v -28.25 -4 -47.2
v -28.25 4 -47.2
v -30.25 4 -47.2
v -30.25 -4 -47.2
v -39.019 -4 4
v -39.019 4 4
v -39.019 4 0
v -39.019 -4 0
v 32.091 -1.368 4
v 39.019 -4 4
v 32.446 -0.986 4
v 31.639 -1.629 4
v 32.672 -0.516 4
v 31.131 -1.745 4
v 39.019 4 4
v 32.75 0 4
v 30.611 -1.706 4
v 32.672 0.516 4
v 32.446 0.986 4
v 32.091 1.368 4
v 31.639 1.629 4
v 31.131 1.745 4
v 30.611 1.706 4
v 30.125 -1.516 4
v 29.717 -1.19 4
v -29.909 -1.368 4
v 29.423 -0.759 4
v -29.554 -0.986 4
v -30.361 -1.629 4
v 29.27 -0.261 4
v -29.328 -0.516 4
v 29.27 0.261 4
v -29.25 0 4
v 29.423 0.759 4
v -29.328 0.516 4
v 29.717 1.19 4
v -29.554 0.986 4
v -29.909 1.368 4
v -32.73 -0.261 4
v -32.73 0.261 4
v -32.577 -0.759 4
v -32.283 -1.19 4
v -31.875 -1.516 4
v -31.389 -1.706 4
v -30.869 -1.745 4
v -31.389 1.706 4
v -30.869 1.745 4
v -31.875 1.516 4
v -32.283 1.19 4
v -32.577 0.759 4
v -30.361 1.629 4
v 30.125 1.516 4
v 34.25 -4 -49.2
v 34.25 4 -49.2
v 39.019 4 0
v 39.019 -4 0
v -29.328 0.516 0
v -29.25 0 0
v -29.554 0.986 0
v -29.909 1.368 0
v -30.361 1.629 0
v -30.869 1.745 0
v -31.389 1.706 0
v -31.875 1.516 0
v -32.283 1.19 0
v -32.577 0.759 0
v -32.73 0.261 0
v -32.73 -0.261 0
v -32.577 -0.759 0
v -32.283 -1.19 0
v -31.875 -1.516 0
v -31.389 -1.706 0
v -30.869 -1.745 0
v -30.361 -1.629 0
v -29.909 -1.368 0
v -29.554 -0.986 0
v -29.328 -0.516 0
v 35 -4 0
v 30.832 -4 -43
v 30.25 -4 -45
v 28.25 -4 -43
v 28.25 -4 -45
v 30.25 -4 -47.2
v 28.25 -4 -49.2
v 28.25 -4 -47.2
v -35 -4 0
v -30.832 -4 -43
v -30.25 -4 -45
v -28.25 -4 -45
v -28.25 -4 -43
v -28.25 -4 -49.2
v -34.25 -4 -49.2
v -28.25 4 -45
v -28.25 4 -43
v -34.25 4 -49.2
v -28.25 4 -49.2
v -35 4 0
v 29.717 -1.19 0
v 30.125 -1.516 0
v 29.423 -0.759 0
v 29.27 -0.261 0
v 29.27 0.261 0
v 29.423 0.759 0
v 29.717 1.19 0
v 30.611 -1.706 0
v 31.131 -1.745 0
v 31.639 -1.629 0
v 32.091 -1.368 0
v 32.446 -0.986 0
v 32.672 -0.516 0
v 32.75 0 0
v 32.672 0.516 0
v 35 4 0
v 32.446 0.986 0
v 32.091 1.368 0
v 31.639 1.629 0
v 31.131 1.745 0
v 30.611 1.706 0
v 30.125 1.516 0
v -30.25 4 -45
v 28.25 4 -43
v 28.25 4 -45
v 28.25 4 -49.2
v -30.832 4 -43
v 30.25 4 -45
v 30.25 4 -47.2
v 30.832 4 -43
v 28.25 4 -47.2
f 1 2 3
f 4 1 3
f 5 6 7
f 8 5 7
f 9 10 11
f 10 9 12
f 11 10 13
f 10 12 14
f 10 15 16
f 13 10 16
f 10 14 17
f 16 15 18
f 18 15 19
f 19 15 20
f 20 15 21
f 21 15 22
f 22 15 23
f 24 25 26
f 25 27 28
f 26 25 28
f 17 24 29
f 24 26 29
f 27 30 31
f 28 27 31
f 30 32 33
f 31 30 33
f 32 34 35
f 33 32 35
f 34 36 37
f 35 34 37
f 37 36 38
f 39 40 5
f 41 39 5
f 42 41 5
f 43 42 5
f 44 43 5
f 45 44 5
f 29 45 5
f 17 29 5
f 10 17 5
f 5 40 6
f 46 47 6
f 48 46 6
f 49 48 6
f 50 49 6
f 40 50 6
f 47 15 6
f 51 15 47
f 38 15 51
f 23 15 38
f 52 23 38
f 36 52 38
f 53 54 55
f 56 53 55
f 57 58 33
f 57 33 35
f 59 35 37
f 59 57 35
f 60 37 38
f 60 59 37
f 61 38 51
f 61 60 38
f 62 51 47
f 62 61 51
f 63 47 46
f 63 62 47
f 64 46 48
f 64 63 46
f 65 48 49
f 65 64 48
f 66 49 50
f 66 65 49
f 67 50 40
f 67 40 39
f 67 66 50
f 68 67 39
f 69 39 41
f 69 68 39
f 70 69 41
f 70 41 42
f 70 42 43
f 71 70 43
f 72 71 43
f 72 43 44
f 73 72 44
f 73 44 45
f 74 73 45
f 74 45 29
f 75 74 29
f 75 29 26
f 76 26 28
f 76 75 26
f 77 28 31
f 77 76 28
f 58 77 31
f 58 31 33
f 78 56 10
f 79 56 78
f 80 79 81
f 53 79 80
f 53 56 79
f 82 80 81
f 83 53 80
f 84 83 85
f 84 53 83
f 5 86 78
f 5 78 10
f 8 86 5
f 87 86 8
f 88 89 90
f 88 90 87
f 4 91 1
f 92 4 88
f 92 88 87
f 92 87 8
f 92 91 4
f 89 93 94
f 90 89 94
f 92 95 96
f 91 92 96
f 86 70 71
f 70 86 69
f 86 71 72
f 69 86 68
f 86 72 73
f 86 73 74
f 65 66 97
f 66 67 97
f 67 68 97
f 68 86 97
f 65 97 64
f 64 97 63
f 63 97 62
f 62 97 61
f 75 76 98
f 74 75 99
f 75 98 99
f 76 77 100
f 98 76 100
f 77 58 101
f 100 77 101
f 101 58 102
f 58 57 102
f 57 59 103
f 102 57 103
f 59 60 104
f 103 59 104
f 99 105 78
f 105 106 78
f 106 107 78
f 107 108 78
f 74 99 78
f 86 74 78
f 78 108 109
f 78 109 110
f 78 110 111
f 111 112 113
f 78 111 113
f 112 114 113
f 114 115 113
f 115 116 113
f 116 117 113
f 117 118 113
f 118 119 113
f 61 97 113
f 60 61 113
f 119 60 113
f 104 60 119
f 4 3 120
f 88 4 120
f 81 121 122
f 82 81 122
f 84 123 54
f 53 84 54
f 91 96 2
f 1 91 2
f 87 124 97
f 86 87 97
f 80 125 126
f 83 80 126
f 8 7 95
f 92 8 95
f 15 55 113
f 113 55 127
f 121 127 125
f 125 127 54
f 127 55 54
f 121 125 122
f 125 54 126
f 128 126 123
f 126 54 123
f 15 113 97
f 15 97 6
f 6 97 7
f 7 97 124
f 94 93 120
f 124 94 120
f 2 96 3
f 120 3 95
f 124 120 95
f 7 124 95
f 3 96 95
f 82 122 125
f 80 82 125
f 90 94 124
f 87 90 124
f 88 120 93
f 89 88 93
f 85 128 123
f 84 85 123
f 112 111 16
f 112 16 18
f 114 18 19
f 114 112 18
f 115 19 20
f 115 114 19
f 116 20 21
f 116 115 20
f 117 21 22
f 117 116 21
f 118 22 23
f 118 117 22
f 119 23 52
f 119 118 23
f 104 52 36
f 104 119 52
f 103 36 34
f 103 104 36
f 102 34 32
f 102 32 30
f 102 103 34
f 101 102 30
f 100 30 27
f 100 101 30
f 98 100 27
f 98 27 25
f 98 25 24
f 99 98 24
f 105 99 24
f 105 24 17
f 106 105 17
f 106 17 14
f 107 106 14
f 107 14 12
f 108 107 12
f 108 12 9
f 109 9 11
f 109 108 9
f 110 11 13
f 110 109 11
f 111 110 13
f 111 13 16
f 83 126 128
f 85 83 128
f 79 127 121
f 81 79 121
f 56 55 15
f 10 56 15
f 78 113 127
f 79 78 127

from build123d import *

# Parameters (mm, degrees)
ESBO_O1_W                = 70
ESBO_O1_H                = 8
ESBO_O1_R                = 1.75
RESSALTO_EXTRUS_O1_DEPTH = 4
RESSALTO_EXTRUS_O2_DEPTH = 8


with BuildPart() as part:
    # Esboço1 → Ressalto-extrusão1 (new body)
    with BuildSketch(Plane.XY):
        Rectangle(ESBO_O1_W, ESBO_O1_H)
        with Locations((-31, 0)):
            Circle(ESBO_O1_R, mode=Mode.SUBTRACT)
        with Locations((31, 0)):
            Circle(ESBO_O1_R, mode=Mode.SUBTRACT)
    extrude(amount=RESSALTO_EXTRUS_O1_DEPTH)

    # Esboço2 → Ressalto-extrusão2 (add)
    with BuildSketch(Plane(origin=(0, 4, 0), x_dir=(1, 0, 0), z_dir=(0, 1, 0))):
        Polygon((-35, 0), (-35, -4), (-39.018745266, -4), (-39.018745266, 0), (-34.25, 49.2), (-28.25, 49.2), (-28.25, 47.2), (-30.25, 47.2), (-30.25, 45), (-28.25, 45), (-28.25, 43), (-30.832194178, 43), align=None)
        Polygon((39.018745266, -4), (35, -4), (35, 0), (30.832194178, 43), (28.25, 43), (28.25, 45), (30.25, 45), (30.25, 47.2), (28.25, 47.2), (28.25, 49.2), (34.25, 49.2), (39.018745266, 0), align=None)
    extrude(amount=-RESSALTO_EXTRUS_O2_DEPTH)


solid = part.part
